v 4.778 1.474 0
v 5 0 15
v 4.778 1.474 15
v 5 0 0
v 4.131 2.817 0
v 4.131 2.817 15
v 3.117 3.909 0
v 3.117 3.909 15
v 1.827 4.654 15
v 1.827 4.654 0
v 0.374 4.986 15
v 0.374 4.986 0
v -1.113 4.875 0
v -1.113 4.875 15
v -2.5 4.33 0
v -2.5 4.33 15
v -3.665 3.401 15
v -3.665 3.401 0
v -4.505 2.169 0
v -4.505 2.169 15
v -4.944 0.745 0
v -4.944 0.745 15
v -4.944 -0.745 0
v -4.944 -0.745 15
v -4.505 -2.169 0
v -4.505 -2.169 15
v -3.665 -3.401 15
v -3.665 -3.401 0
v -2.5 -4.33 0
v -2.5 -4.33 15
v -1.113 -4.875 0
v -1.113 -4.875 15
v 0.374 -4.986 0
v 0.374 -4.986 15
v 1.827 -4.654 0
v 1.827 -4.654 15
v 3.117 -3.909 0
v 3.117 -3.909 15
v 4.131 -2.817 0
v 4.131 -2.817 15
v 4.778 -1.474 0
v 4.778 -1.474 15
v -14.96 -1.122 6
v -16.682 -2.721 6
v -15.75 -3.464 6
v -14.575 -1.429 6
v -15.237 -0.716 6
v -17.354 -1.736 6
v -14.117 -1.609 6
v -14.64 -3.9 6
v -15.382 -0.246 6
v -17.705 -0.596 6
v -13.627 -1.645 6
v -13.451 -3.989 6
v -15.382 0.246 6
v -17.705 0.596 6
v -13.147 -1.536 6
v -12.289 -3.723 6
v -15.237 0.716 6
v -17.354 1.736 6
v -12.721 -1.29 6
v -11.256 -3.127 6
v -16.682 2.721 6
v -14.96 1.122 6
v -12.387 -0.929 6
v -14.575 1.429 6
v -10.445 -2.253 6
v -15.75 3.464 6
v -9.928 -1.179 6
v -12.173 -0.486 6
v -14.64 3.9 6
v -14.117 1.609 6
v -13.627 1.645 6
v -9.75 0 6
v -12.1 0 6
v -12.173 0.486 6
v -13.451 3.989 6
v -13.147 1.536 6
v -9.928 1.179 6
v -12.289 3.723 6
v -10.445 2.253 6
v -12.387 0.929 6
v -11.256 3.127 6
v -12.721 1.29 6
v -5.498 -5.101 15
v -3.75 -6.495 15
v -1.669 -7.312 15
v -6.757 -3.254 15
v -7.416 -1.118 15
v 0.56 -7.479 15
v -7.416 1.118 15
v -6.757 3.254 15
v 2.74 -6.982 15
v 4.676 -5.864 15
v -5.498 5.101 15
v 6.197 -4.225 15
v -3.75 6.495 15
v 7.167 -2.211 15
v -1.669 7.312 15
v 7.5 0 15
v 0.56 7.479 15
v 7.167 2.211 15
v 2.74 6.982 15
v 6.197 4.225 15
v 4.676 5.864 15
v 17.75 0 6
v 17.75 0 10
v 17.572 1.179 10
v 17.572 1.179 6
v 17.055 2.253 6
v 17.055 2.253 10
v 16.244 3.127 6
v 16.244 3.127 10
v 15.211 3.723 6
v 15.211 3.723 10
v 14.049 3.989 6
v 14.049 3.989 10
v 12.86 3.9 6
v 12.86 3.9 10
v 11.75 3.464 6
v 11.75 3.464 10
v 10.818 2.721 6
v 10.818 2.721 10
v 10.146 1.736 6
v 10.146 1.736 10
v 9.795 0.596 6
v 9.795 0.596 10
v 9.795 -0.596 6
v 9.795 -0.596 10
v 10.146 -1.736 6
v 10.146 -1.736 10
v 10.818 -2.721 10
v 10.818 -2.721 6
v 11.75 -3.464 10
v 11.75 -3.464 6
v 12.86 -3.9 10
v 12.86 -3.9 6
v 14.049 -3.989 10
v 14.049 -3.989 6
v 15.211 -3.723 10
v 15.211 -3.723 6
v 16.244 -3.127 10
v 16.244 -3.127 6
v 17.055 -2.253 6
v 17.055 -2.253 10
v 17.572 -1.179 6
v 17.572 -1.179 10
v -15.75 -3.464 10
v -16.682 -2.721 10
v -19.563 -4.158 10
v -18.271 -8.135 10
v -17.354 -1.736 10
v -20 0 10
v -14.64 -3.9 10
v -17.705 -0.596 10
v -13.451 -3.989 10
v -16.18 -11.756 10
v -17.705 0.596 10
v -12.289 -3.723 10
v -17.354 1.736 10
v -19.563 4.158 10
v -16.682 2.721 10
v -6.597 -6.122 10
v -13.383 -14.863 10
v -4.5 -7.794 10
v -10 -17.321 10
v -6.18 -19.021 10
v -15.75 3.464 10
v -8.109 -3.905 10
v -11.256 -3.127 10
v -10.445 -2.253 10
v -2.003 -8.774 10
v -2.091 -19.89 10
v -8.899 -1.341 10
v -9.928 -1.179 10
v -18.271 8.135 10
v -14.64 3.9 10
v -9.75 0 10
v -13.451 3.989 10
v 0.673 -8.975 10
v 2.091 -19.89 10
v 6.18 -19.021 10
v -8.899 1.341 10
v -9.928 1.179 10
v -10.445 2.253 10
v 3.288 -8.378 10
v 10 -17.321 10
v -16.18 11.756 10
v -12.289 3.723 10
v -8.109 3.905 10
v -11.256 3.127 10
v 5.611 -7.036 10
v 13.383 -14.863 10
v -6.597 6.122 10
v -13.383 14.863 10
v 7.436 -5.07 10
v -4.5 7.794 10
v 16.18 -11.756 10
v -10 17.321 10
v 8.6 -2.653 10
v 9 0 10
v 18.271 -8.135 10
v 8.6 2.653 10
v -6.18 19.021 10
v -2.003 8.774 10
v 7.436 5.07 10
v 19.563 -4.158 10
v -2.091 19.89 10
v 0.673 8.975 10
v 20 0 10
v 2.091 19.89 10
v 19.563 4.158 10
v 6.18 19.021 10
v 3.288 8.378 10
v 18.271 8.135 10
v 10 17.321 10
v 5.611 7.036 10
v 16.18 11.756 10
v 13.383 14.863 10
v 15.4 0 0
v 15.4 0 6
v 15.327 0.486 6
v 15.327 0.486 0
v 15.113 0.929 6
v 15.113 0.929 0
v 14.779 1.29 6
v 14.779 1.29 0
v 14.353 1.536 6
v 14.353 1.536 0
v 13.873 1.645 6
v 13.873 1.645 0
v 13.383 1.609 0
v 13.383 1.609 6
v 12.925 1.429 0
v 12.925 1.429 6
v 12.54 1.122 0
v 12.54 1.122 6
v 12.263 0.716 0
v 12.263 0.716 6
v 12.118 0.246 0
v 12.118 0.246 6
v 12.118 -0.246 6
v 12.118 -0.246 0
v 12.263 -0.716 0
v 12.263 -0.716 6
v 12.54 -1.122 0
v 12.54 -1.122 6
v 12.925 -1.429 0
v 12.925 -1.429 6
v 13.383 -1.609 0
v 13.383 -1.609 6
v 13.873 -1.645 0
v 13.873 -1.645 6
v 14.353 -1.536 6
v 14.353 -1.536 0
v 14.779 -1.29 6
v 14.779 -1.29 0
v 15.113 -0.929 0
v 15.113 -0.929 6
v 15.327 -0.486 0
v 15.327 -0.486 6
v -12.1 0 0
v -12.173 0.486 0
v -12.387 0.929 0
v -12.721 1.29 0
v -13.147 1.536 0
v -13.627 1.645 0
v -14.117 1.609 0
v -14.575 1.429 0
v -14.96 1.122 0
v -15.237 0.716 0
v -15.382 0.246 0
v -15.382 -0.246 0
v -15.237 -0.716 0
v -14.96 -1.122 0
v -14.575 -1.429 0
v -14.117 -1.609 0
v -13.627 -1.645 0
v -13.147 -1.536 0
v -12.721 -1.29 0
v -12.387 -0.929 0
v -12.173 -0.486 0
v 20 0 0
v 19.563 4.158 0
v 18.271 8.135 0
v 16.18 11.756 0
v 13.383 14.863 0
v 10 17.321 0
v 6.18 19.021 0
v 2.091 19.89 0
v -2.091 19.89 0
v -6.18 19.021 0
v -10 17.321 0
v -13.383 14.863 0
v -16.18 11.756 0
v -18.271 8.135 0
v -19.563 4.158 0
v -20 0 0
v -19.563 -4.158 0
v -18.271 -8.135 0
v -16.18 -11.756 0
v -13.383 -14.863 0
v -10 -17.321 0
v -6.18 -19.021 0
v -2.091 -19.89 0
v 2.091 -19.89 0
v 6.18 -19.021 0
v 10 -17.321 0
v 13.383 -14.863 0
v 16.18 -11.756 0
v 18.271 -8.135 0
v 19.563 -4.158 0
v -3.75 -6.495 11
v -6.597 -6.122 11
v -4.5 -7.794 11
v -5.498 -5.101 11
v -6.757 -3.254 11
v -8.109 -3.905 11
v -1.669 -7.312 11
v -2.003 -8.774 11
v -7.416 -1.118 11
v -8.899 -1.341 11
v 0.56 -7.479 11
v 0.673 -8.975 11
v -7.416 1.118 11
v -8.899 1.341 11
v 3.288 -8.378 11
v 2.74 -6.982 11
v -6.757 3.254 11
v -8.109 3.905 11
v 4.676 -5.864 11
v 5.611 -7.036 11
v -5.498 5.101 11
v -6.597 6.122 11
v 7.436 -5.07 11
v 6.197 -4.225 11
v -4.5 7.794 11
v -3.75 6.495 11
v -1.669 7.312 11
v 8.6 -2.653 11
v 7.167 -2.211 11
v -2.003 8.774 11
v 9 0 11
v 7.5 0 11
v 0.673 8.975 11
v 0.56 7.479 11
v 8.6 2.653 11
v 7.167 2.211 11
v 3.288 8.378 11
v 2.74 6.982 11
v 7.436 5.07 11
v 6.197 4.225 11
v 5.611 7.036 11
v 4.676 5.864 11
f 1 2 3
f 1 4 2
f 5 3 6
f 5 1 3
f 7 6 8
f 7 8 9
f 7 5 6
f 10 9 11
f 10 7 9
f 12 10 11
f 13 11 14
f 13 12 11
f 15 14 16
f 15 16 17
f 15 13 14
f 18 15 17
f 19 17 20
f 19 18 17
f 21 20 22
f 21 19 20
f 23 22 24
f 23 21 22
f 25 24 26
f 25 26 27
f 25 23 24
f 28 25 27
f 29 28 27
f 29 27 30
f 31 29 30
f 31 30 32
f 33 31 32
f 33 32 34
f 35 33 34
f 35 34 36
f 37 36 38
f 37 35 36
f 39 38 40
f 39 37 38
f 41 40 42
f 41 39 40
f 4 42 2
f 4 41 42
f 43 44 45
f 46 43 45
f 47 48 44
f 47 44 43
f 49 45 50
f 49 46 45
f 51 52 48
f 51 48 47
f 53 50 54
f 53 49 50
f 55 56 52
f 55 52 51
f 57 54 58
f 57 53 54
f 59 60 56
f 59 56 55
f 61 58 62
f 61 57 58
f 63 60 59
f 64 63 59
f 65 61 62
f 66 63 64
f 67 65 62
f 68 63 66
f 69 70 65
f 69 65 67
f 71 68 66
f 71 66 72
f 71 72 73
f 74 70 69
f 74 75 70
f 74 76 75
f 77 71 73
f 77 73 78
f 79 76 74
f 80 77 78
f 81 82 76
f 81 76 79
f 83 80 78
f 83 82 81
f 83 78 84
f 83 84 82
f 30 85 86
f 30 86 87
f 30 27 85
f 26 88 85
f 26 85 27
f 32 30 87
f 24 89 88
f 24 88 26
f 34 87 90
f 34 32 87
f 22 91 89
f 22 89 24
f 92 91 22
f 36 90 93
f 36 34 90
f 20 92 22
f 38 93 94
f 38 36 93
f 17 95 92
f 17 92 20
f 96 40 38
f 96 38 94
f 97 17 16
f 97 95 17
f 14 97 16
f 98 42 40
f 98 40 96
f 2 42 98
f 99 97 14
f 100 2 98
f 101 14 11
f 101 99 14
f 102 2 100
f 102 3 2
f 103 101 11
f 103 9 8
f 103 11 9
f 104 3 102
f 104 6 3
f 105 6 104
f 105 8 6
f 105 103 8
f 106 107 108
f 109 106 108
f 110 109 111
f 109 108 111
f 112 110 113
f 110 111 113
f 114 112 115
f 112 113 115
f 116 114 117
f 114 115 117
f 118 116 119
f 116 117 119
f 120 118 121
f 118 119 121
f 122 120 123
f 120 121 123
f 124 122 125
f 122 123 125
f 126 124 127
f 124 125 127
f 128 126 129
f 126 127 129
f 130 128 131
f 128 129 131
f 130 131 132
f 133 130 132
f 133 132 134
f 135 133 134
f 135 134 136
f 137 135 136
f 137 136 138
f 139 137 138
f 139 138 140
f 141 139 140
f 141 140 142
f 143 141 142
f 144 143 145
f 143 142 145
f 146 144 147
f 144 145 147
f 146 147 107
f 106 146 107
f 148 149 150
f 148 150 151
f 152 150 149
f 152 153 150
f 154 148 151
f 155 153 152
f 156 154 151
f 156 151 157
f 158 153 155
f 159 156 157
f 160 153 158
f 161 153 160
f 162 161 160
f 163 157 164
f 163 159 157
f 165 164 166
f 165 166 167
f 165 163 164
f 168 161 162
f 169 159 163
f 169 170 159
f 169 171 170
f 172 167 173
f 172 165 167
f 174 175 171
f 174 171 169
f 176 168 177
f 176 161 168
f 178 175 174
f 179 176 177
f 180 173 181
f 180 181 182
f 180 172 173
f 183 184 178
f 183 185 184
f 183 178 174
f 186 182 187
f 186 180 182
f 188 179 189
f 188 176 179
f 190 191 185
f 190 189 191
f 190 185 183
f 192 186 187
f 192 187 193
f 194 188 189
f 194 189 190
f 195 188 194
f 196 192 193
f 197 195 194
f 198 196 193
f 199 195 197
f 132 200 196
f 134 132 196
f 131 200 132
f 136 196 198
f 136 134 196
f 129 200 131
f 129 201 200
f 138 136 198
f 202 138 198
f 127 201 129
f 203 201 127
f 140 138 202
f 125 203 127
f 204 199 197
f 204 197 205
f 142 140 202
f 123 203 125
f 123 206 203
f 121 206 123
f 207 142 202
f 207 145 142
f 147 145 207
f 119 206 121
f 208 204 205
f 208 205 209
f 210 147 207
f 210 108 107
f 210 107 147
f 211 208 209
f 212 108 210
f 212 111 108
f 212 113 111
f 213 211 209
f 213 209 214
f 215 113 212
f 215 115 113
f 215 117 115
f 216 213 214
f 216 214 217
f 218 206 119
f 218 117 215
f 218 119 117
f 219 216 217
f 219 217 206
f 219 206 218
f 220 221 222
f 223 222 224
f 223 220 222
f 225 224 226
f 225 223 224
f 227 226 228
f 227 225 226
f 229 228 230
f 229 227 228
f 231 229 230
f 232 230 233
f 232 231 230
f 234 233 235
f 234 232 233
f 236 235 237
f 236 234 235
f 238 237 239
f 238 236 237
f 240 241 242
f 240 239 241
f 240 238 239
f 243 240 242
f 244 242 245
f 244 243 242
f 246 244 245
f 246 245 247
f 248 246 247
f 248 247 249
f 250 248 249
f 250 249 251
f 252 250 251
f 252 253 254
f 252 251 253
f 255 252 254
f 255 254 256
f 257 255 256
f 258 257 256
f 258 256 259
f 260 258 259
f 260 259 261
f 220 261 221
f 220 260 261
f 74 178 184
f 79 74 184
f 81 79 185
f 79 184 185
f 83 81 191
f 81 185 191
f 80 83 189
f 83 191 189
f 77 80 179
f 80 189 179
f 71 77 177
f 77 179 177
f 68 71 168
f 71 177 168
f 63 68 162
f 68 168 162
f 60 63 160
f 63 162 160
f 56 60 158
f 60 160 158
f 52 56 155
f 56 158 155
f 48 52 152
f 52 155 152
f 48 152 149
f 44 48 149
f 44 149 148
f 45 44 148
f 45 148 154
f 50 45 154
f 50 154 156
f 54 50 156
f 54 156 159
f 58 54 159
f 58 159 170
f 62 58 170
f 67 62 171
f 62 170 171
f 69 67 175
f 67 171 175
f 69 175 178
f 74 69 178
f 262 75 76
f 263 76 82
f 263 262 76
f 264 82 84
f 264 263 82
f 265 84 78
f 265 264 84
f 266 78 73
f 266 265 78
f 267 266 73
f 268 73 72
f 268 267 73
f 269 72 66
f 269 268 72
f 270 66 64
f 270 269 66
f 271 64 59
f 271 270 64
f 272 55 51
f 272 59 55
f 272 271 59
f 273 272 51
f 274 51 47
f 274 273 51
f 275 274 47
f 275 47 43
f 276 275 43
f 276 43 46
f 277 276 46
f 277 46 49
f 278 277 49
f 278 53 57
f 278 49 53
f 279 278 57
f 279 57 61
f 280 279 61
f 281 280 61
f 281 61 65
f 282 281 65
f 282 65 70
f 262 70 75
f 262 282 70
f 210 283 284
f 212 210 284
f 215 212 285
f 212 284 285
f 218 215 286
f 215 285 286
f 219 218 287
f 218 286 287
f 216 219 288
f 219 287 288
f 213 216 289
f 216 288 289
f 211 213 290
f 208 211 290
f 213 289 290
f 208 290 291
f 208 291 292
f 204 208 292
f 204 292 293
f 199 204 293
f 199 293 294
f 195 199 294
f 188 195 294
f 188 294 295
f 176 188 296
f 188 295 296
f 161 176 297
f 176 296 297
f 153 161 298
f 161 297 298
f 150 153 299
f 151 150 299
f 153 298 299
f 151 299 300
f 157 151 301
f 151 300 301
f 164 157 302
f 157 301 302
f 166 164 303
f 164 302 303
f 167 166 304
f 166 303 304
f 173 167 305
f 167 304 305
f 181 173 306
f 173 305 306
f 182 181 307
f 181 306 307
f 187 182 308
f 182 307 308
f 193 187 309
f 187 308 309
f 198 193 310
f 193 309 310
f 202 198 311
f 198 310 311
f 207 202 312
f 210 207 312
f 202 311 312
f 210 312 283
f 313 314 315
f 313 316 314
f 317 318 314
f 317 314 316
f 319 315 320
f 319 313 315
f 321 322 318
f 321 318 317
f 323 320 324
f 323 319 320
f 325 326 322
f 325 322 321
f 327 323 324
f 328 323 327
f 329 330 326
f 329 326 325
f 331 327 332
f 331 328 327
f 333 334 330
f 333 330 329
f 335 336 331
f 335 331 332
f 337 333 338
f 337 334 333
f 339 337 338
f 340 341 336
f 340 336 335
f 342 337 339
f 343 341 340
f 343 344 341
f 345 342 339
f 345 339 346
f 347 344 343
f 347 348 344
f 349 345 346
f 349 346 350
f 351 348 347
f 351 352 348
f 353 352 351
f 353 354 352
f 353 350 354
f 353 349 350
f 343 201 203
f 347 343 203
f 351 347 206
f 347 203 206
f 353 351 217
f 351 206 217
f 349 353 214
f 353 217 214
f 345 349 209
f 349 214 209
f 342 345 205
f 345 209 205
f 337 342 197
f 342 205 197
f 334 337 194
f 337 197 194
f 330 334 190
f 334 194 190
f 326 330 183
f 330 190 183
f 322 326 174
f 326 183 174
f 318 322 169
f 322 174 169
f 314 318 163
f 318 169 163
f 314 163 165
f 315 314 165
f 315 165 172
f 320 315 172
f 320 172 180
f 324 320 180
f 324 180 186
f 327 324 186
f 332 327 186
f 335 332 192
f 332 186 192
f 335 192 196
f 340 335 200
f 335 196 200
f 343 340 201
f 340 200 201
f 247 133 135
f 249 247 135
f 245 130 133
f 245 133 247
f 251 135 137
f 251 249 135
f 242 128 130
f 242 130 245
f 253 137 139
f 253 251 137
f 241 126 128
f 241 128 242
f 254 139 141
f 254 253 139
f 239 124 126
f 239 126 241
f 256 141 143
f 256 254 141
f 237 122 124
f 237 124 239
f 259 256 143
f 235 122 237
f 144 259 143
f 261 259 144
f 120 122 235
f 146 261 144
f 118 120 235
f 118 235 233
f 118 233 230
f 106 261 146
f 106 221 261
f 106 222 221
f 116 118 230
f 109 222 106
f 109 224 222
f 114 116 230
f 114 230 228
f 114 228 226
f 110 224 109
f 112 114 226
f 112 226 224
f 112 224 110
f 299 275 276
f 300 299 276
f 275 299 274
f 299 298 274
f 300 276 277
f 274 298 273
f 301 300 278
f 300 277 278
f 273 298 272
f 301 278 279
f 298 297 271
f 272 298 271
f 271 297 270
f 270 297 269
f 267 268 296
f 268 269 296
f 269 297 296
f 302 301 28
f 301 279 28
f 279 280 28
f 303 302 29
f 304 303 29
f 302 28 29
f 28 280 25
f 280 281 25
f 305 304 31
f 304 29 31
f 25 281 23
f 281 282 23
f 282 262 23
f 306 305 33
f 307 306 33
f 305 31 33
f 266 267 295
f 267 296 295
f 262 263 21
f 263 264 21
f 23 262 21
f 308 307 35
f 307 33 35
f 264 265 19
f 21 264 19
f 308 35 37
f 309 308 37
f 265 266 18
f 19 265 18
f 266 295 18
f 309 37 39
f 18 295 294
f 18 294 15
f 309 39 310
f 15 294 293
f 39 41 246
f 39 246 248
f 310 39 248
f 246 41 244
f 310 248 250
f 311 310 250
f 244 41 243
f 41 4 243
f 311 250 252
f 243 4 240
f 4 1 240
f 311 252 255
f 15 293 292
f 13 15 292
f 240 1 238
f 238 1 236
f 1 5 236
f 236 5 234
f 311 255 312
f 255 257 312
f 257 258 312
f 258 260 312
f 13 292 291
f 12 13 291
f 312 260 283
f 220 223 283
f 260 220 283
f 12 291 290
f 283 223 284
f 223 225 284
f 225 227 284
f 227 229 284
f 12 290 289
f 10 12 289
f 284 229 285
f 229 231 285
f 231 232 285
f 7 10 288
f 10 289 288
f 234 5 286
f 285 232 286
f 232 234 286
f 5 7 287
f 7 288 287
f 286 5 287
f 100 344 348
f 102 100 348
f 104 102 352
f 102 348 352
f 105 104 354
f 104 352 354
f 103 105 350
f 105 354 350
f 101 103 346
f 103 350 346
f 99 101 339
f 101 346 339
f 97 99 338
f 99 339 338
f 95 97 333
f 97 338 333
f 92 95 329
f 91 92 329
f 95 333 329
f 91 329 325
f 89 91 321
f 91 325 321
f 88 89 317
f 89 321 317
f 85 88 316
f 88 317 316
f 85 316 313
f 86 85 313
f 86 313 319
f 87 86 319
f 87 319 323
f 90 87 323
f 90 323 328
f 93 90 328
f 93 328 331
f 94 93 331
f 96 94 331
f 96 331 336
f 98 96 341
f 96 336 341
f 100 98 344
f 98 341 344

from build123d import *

# Parameters (mm, degrees)
SKETCH_1_R          = 20
SKETCH_1_R_2        = 5
SKETCH_1_R_3        = 1.65
EXTRUDE_1_DEPTH     = 10
SKETCH_2_R          = 9
SKETCH_2_R_2        = 5
EXTRUDE_2_DEPTH     = 1
SKETCH_3_R          = 7.5
SKETCH_3_R_2        = 5
EXTRUDE_3_DEPTH     = 4
SKETCH_4_R          = 4
CUT_EXTRUDE_1_DEPTH = 4


with BuildPart() as part:
    # ｽｹｯﾁ1 → ﾎﾞｽ - 押し出し1 (new body)
    with BuildSketch(Plane.XY):
        Circle(SKETCH_1_R)
        Circle(SKETCH_1_R_2, mode=Mode.SUBTRACT)
        with Locations((-13.75, 0)):
            Circle(SKETCH_1_R_3, mode=Mode.SUBTRACT)
        with Locations((13.75, 0)):
            Circle(SKETCH_1_R_3, mode=Mode.SUBTRACT)
    extrude(amount=EXTRUDE_1_DEPTH)

    # ｽｹｯﾁ2 → ﾎﾞｽ - 押し出し2 (add)
    with BuildSketch(Plane.XY.offset(10)):
        Circle(SKETCH_2_R)
        Circle(SKETCH_2_R_2, mode=Mode.SUBTRACT)
    extrude(amount=EXTRUDE_2_DEPTH)

    # ｽｹｯﾁ3 → ﾎﾞｽ - 押し出し3 (add)
    with BuildSketch(Plane.XY.offset(11)):
        Circle(SKETCH_3_R)
        Circle(SKETCH_3_R_2, mode=Mode.SUBTRACT)
    extrude(amount=EXTRUDE_3_DEPTH)

    # ｽｹｯﾁ4 → ｶｯﾄ - 押し出し1 (cut)
    with BuildSketch(Plane.XY.offset(10)):
        with Locations((-13.75, 0)):
            Circle(SKETCH_4_R)
        with Locations((13.75, 0)):
            Circle(SKETCH_4_R)
    extrude(amount=-CUT_EXTRUDE_1_DEPTH, mode=Mode.SUBTRACT)


solid = part.part
